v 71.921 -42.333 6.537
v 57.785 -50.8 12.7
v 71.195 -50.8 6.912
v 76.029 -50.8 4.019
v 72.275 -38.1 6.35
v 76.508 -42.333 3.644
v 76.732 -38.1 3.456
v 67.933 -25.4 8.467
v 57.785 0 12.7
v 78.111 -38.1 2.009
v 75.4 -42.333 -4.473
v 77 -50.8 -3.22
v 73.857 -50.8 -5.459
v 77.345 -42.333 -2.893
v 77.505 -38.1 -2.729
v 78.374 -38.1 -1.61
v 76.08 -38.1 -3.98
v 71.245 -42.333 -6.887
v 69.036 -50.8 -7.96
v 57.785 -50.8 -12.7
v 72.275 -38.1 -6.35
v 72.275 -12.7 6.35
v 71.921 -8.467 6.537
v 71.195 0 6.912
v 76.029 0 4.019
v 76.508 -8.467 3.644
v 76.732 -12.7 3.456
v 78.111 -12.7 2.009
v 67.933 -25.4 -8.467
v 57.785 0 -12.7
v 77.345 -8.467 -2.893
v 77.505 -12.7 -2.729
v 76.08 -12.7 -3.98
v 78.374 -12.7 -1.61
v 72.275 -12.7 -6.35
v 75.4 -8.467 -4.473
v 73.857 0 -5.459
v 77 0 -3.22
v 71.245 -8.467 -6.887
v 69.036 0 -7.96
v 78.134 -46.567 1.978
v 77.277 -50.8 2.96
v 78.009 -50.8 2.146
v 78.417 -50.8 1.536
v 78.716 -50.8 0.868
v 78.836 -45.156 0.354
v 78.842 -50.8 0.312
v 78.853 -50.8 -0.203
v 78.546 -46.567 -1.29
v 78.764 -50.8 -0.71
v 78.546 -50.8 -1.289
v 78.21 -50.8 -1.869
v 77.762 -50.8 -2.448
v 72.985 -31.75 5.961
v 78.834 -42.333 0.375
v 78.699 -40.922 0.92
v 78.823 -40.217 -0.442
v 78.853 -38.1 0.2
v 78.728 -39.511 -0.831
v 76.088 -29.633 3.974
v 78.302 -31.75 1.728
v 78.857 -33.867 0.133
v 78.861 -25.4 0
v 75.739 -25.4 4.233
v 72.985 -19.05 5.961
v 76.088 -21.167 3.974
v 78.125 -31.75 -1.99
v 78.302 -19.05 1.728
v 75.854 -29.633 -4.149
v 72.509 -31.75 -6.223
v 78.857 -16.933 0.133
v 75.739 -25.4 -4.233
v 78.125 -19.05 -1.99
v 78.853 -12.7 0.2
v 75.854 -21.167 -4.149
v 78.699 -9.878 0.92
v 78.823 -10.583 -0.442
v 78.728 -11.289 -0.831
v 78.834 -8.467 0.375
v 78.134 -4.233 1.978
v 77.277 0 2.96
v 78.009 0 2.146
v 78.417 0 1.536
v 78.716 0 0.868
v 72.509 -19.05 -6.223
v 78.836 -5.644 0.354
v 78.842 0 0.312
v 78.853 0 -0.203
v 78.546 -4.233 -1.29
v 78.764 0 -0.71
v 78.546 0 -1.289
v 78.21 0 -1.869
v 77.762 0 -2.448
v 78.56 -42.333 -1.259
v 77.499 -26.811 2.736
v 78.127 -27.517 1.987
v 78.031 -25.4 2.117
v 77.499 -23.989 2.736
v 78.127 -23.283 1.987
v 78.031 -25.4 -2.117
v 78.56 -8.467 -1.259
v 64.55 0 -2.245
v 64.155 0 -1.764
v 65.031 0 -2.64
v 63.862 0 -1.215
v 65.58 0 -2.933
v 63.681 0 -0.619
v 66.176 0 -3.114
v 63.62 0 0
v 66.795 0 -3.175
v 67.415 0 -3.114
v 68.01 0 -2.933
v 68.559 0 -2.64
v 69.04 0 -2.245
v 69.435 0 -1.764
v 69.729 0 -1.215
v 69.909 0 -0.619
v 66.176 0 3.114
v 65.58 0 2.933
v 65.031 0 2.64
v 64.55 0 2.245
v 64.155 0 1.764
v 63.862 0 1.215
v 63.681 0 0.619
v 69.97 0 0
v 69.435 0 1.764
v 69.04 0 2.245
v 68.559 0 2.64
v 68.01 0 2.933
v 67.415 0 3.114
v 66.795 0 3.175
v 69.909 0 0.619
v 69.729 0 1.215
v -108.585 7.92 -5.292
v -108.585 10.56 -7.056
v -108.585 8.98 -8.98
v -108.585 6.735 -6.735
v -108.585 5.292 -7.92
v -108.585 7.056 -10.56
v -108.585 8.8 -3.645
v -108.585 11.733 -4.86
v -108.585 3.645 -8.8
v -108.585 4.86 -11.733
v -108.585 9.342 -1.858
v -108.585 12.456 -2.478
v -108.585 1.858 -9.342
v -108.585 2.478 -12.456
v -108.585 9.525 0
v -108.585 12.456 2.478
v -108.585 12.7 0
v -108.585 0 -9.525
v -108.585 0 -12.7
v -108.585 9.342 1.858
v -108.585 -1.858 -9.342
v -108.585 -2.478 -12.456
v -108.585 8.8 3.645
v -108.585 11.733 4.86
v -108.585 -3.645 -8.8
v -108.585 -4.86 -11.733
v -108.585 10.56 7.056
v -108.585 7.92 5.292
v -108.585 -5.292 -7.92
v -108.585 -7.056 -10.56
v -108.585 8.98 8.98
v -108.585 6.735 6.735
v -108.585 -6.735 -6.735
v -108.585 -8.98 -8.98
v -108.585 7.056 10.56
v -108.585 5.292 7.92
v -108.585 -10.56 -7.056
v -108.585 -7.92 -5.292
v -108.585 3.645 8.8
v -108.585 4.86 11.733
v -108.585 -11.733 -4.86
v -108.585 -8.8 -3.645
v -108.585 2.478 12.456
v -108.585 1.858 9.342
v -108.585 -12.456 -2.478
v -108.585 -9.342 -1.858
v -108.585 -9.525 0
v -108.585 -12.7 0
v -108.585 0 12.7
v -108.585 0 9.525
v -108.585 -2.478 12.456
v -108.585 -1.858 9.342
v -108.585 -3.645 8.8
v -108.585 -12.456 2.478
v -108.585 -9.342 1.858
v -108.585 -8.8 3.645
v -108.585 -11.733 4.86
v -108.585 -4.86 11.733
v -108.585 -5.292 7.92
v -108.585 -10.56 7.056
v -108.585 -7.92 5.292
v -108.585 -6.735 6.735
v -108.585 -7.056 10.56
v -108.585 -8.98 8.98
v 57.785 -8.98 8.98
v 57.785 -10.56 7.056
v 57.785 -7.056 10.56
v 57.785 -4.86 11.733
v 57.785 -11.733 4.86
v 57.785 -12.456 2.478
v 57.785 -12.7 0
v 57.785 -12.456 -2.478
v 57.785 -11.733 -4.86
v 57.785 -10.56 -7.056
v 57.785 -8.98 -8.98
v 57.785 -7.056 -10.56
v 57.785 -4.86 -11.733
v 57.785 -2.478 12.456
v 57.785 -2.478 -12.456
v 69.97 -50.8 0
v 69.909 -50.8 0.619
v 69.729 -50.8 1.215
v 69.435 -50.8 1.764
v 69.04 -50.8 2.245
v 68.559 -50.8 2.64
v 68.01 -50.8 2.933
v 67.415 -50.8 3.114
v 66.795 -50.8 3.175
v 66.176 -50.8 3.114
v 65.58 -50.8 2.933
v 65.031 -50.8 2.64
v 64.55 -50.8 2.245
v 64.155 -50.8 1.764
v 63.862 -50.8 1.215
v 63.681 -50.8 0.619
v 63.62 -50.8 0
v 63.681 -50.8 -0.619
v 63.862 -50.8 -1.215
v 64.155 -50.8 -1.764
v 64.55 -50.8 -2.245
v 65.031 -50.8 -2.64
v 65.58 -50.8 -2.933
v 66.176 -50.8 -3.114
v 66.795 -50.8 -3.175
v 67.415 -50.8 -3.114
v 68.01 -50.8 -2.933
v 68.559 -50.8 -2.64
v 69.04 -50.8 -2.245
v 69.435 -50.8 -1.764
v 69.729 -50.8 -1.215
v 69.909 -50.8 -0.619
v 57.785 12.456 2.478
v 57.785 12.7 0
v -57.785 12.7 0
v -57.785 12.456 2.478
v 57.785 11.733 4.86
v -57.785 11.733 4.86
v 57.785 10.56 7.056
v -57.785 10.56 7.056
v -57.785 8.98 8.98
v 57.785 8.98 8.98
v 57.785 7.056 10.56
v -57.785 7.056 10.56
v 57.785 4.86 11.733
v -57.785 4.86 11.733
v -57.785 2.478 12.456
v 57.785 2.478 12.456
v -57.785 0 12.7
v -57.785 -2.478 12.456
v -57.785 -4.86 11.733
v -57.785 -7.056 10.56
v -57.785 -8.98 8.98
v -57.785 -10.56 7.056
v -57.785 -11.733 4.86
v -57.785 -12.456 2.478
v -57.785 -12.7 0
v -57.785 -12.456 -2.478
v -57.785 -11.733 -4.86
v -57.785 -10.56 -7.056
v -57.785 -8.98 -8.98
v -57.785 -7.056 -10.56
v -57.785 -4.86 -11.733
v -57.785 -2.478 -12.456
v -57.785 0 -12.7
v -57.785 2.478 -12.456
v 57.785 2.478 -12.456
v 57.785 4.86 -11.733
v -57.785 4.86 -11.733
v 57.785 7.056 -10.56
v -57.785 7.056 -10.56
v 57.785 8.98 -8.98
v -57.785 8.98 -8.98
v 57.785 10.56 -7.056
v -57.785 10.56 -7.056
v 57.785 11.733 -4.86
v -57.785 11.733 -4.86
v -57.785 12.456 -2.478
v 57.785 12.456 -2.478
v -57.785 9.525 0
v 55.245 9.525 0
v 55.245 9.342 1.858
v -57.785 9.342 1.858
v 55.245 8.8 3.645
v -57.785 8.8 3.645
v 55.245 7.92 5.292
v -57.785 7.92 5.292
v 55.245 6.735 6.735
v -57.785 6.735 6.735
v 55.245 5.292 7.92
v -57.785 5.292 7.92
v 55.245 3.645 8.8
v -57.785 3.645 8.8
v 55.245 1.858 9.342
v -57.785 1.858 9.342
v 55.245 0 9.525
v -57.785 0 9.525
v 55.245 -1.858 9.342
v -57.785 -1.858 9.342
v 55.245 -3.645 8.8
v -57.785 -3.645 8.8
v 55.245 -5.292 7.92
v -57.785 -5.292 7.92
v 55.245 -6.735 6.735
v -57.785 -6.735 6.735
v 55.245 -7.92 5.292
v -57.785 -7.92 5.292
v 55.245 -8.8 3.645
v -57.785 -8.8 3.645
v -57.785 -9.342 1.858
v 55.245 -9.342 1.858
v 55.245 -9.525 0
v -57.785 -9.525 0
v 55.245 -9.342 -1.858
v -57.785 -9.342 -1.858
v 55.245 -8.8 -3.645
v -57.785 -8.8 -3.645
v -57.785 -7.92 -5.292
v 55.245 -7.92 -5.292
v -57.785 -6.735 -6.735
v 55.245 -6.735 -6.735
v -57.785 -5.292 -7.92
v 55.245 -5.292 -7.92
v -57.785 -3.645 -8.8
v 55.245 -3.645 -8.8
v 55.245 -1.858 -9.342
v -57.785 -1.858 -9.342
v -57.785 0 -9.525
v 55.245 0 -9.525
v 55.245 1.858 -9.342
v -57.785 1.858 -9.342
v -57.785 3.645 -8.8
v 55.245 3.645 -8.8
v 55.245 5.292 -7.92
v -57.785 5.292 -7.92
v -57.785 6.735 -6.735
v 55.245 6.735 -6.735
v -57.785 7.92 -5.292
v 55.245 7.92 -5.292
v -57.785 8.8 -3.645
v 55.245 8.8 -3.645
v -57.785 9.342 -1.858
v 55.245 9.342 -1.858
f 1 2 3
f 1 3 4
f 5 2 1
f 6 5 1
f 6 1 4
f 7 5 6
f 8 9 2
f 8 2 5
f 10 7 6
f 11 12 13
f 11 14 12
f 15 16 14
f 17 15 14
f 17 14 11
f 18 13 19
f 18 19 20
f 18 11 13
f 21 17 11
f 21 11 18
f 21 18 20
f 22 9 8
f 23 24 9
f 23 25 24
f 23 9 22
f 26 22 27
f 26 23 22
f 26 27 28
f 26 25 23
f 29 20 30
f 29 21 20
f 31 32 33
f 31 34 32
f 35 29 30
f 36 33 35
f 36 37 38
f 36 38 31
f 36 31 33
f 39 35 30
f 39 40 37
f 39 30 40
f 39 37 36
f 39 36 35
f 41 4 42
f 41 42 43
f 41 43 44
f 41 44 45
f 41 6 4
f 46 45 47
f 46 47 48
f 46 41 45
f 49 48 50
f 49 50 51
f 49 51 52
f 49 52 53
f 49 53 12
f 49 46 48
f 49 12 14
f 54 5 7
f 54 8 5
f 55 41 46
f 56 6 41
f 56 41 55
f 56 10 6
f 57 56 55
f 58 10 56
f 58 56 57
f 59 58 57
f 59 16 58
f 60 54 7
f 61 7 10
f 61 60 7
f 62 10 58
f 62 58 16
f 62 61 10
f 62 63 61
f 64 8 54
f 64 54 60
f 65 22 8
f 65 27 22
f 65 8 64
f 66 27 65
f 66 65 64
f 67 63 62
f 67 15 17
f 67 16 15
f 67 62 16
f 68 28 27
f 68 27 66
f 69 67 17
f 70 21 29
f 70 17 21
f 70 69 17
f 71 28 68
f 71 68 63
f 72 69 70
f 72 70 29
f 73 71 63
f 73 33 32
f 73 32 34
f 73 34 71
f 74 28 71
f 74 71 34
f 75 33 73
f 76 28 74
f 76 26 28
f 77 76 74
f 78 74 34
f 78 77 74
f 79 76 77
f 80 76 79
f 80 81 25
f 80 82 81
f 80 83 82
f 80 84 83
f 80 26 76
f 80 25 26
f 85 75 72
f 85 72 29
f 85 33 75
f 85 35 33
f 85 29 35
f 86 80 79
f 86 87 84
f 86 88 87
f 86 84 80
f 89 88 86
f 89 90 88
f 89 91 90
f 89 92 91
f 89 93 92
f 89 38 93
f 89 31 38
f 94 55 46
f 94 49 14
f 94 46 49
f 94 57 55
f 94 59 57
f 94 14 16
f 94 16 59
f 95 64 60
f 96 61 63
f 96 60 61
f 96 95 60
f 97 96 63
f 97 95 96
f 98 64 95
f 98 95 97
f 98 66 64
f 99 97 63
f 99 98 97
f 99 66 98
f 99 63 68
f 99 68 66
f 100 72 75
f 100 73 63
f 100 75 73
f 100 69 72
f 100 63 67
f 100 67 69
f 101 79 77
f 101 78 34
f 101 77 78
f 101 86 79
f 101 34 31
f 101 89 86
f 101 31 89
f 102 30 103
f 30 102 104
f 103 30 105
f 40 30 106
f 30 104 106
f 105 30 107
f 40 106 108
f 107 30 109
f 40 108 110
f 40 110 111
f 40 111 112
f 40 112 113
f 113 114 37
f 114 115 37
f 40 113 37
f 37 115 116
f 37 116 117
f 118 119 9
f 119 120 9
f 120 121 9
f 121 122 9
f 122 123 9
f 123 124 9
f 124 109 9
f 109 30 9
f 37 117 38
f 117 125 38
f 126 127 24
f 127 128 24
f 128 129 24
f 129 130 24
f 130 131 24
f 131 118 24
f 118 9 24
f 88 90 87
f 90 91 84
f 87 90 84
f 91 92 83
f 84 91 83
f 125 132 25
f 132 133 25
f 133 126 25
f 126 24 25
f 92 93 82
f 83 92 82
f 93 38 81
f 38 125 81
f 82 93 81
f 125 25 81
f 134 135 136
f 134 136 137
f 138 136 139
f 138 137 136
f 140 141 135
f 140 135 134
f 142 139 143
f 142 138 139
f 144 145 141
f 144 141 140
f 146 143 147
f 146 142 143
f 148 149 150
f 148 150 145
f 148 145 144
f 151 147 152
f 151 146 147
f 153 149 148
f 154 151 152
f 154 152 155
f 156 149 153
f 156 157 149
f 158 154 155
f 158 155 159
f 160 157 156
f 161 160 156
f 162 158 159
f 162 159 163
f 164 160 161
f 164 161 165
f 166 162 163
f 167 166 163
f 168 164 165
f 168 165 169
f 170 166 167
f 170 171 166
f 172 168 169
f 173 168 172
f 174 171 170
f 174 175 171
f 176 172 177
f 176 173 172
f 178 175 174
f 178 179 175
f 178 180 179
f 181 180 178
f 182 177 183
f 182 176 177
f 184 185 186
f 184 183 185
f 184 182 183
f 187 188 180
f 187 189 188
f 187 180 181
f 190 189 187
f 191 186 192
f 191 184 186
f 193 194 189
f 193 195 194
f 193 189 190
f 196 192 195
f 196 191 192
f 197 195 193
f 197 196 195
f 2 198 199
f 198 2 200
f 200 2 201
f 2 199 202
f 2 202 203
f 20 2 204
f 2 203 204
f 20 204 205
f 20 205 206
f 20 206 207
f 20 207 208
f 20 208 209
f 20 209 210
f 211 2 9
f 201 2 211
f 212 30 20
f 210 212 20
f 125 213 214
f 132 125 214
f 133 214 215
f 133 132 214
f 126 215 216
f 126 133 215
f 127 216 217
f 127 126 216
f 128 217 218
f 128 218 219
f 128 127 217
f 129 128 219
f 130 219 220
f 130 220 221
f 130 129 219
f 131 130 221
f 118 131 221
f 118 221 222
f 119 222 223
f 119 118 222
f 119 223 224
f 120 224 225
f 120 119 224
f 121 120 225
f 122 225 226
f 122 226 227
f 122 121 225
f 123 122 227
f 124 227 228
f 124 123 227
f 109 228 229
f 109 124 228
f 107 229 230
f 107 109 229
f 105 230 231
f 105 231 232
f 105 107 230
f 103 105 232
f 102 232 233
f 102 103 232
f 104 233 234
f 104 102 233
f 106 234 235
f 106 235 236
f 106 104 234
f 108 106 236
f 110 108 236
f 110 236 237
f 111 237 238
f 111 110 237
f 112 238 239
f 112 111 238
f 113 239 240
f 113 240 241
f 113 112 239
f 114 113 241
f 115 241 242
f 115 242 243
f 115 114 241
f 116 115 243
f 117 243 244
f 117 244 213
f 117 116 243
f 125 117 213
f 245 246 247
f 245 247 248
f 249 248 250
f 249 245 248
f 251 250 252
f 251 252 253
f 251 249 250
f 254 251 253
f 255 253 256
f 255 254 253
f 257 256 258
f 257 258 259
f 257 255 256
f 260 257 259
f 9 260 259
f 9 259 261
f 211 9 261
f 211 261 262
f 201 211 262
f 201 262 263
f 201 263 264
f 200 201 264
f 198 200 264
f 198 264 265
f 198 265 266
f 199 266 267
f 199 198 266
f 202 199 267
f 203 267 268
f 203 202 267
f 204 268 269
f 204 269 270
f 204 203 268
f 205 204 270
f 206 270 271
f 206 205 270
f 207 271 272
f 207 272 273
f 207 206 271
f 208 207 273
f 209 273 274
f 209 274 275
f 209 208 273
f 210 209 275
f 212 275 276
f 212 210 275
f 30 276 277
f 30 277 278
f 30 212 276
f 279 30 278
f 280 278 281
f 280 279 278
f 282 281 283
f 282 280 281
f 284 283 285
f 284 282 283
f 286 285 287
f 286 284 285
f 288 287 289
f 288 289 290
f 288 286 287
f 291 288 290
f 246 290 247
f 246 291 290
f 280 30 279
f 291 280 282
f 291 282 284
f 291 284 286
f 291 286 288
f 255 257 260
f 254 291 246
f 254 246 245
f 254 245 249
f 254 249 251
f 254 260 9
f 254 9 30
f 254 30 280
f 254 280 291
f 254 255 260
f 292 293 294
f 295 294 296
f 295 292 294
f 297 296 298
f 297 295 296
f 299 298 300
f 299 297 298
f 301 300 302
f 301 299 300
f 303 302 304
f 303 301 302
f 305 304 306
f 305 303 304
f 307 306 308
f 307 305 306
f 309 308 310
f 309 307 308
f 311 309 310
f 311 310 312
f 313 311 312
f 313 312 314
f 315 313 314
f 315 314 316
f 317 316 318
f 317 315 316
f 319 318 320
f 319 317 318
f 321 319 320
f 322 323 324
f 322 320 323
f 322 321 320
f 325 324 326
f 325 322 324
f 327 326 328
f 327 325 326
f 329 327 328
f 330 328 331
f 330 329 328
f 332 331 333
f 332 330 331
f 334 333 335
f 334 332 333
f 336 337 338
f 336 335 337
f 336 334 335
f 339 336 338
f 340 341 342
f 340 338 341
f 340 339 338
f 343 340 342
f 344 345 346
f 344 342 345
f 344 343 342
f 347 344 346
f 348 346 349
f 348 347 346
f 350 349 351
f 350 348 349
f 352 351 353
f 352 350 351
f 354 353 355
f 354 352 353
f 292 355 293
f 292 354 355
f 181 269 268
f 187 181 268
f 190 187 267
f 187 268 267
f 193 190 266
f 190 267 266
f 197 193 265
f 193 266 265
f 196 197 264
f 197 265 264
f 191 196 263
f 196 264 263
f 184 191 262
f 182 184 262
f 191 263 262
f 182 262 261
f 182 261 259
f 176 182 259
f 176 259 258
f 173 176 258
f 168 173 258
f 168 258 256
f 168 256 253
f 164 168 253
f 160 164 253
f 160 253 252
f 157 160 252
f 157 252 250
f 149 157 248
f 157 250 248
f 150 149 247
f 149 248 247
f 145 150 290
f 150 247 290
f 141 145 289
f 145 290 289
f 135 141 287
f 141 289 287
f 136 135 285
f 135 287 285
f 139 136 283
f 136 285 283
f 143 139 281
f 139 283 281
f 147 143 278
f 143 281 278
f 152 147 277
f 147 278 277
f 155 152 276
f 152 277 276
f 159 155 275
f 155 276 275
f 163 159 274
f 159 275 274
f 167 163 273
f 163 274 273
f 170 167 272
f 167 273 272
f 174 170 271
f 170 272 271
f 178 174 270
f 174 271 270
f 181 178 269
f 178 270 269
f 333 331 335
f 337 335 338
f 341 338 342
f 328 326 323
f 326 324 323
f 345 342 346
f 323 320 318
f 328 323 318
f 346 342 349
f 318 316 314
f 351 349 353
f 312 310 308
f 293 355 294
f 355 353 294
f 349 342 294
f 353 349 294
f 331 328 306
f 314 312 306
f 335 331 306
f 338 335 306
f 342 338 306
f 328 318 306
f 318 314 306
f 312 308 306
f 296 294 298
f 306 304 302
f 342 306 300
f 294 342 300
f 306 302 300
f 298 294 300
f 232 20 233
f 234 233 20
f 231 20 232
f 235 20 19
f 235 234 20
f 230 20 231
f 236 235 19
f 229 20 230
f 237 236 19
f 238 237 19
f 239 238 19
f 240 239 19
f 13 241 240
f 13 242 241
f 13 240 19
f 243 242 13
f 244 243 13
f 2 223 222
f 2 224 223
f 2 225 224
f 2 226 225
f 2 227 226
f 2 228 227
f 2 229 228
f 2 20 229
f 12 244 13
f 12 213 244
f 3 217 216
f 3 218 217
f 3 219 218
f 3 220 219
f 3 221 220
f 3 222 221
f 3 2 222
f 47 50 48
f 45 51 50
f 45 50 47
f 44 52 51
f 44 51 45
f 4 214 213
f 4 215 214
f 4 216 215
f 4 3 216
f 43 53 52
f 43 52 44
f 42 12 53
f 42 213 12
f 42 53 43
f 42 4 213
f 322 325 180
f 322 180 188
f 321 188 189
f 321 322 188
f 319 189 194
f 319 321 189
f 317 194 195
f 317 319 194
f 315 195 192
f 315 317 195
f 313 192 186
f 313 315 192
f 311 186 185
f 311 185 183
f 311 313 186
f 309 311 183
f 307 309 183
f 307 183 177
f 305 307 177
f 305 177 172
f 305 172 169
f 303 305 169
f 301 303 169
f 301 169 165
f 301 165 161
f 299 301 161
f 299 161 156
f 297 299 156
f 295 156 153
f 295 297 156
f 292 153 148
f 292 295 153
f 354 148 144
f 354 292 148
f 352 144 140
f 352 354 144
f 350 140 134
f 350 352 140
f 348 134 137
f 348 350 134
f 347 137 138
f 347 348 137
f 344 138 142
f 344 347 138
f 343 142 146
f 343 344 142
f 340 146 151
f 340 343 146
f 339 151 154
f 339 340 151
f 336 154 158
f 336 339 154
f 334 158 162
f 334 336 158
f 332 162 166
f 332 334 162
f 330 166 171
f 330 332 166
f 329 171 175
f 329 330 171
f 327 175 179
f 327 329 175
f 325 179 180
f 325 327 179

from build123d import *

# Parameters (mm, degrees)
F0_R     = 12.7
F0_R_2   = 9.525
F1_DEPTH = 57.785
F2_R     = 12.7
F3_DEPTH = 2.54
F4_R     = 3.175
F5_DEPTH = 50.8
F6_R     = 12.7
F6_R_2   = 9.525
F7_DEPTH = 50.8


with BuildPart() as f1:
    # F0 (on Right) → F1 (new body, symmetric)
    with BuildSketch(Plane.YZ):
        Circle(F0_R)
        Circle(F0_R_2, mode=Mode.SUBTRACT)
    extrude(amount=F1_DEPTH, both=True)

    # F2 (on face) → F3 (join)
    with BuildSketch(Plane.YZ.offset(57.785)):
        Circle(F2_R)
    extrude(amount=-F3_DEPTH)

    # F4 (on Front) → F5 (join)
    with BuildSketch(Plane.XZ):
        with BuildLine():
            Line((57.785, 12.7), (57.785, 0))
            Line((57.785, 0), (57.785, -12.7))
            add(Edge.make_bspline(
                [(57.785, 12.7), (68.3229282963, 8.4666666667), (89.398784889, 0), (68.3229282963, -8.4666666667), (57.785, -12.7)],
                knots=[0, 0, 0, 0, 0.5, 1, 1, 1, 1], degree=3))
        make_face()
        with Locations((66.7953193188, 0)):
            Circle(F4_R, mode=Mode.SUBTRACT)
    extrude(amount=F5_DEPTH)

    # F6 (on face) → F7 (join)
    with BuildSketch(Plane(origin=(-57.785, 0, 0), x_dir=(0, -1, 0), z_dir=(-1, 0, 0))):
        Circle(F6_R)
        Circle(F6_R_2, mode=Mode.SUBTRACT)
    extrude(amount=F7_DEPTH)


solid = f1.part
